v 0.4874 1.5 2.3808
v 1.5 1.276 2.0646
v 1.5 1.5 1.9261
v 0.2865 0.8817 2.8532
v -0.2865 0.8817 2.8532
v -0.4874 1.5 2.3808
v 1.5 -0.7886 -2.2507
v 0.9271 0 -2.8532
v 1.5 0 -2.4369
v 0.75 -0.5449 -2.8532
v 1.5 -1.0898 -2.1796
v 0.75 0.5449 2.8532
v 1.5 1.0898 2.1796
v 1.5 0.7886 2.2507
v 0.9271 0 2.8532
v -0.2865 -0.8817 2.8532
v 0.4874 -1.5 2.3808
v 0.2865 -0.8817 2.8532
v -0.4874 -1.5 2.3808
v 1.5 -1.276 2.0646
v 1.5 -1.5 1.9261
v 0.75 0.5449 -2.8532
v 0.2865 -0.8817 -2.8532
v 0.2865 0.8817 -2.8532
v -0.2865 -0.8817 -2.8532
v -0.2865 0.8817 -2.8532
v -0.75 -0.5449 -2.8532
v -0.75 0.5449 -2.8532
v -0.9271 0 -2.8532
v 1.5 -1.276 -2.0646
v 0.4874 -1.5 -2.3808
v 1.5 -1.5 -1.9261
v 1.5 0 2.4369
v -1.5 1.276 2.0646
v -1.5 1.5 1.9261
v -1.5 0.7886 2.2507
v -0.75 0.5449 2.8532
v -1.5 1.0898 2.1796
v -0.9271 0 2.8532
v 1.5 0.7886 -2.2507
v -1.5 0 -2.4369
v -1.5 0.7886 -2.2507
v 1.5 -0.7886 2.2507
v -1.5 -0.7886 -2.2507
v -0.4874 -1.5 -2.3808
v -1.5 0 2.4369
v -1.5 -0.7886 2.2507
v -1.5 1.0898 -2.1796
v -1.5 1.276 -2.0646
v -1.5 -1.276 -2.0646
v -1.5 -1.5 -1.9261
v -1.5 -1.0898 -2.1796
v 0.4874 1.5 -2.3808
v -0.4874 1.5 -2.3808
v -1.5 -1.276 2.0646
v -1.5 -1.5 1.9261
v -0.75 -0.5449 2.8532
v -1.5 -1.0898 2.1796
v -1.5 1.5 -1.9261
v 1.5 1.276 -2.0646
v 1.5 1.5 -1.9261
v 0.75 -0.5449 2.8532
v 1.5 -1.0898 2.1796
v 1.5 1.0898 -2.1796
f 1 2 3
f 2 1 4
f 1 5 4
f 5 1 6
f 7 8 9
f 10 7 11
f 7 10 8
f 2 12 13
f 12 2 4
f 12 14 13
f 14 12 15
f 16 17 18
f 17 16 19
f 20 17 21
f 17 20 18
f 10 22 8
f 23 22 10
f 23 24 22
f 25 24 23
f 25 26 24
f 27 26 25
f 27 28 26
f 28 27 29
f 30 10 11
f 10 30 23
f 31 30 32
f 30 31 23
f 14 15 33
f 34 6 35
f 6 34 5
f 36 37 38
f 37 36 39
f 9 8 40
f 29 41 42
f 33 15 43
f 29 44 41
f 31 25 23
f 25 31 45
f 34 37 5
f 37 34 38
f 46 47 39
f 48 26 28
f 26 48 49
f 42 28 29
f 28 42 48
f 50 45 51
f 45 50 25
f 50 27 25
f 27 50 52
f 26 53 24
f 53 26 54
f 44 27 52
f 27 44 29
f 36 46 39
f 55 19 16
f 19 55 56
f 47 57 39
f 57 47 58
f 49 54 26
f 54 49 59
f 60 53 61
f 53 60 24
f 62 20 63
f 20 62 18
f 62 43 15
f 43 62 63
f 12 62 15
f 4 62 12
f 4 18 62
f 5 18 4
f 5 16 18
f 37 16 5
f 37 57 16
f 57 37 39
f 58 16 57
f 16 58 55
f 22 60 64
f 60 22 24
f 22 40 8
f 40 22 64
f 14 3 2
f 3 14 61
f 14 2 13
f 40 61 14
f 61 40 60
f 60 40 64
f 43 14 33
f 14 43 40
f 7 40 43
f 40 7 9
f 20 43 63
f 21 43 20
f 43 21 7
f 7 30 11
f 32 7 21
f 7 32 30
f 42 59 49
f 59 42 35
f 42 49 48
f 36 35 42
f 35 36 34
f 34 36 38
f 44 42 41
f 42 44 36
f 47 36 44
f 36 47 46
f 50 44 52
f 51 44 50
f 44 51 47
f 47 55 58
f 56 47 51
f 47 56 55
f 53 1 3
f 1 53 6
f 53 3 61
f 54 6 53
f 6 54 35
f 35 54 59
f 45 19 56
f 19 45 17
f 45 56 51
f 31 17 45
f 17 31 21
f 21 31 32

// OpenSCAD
intersection() {
  sphere(3);
  cube([3,3,8], center=true);
}
